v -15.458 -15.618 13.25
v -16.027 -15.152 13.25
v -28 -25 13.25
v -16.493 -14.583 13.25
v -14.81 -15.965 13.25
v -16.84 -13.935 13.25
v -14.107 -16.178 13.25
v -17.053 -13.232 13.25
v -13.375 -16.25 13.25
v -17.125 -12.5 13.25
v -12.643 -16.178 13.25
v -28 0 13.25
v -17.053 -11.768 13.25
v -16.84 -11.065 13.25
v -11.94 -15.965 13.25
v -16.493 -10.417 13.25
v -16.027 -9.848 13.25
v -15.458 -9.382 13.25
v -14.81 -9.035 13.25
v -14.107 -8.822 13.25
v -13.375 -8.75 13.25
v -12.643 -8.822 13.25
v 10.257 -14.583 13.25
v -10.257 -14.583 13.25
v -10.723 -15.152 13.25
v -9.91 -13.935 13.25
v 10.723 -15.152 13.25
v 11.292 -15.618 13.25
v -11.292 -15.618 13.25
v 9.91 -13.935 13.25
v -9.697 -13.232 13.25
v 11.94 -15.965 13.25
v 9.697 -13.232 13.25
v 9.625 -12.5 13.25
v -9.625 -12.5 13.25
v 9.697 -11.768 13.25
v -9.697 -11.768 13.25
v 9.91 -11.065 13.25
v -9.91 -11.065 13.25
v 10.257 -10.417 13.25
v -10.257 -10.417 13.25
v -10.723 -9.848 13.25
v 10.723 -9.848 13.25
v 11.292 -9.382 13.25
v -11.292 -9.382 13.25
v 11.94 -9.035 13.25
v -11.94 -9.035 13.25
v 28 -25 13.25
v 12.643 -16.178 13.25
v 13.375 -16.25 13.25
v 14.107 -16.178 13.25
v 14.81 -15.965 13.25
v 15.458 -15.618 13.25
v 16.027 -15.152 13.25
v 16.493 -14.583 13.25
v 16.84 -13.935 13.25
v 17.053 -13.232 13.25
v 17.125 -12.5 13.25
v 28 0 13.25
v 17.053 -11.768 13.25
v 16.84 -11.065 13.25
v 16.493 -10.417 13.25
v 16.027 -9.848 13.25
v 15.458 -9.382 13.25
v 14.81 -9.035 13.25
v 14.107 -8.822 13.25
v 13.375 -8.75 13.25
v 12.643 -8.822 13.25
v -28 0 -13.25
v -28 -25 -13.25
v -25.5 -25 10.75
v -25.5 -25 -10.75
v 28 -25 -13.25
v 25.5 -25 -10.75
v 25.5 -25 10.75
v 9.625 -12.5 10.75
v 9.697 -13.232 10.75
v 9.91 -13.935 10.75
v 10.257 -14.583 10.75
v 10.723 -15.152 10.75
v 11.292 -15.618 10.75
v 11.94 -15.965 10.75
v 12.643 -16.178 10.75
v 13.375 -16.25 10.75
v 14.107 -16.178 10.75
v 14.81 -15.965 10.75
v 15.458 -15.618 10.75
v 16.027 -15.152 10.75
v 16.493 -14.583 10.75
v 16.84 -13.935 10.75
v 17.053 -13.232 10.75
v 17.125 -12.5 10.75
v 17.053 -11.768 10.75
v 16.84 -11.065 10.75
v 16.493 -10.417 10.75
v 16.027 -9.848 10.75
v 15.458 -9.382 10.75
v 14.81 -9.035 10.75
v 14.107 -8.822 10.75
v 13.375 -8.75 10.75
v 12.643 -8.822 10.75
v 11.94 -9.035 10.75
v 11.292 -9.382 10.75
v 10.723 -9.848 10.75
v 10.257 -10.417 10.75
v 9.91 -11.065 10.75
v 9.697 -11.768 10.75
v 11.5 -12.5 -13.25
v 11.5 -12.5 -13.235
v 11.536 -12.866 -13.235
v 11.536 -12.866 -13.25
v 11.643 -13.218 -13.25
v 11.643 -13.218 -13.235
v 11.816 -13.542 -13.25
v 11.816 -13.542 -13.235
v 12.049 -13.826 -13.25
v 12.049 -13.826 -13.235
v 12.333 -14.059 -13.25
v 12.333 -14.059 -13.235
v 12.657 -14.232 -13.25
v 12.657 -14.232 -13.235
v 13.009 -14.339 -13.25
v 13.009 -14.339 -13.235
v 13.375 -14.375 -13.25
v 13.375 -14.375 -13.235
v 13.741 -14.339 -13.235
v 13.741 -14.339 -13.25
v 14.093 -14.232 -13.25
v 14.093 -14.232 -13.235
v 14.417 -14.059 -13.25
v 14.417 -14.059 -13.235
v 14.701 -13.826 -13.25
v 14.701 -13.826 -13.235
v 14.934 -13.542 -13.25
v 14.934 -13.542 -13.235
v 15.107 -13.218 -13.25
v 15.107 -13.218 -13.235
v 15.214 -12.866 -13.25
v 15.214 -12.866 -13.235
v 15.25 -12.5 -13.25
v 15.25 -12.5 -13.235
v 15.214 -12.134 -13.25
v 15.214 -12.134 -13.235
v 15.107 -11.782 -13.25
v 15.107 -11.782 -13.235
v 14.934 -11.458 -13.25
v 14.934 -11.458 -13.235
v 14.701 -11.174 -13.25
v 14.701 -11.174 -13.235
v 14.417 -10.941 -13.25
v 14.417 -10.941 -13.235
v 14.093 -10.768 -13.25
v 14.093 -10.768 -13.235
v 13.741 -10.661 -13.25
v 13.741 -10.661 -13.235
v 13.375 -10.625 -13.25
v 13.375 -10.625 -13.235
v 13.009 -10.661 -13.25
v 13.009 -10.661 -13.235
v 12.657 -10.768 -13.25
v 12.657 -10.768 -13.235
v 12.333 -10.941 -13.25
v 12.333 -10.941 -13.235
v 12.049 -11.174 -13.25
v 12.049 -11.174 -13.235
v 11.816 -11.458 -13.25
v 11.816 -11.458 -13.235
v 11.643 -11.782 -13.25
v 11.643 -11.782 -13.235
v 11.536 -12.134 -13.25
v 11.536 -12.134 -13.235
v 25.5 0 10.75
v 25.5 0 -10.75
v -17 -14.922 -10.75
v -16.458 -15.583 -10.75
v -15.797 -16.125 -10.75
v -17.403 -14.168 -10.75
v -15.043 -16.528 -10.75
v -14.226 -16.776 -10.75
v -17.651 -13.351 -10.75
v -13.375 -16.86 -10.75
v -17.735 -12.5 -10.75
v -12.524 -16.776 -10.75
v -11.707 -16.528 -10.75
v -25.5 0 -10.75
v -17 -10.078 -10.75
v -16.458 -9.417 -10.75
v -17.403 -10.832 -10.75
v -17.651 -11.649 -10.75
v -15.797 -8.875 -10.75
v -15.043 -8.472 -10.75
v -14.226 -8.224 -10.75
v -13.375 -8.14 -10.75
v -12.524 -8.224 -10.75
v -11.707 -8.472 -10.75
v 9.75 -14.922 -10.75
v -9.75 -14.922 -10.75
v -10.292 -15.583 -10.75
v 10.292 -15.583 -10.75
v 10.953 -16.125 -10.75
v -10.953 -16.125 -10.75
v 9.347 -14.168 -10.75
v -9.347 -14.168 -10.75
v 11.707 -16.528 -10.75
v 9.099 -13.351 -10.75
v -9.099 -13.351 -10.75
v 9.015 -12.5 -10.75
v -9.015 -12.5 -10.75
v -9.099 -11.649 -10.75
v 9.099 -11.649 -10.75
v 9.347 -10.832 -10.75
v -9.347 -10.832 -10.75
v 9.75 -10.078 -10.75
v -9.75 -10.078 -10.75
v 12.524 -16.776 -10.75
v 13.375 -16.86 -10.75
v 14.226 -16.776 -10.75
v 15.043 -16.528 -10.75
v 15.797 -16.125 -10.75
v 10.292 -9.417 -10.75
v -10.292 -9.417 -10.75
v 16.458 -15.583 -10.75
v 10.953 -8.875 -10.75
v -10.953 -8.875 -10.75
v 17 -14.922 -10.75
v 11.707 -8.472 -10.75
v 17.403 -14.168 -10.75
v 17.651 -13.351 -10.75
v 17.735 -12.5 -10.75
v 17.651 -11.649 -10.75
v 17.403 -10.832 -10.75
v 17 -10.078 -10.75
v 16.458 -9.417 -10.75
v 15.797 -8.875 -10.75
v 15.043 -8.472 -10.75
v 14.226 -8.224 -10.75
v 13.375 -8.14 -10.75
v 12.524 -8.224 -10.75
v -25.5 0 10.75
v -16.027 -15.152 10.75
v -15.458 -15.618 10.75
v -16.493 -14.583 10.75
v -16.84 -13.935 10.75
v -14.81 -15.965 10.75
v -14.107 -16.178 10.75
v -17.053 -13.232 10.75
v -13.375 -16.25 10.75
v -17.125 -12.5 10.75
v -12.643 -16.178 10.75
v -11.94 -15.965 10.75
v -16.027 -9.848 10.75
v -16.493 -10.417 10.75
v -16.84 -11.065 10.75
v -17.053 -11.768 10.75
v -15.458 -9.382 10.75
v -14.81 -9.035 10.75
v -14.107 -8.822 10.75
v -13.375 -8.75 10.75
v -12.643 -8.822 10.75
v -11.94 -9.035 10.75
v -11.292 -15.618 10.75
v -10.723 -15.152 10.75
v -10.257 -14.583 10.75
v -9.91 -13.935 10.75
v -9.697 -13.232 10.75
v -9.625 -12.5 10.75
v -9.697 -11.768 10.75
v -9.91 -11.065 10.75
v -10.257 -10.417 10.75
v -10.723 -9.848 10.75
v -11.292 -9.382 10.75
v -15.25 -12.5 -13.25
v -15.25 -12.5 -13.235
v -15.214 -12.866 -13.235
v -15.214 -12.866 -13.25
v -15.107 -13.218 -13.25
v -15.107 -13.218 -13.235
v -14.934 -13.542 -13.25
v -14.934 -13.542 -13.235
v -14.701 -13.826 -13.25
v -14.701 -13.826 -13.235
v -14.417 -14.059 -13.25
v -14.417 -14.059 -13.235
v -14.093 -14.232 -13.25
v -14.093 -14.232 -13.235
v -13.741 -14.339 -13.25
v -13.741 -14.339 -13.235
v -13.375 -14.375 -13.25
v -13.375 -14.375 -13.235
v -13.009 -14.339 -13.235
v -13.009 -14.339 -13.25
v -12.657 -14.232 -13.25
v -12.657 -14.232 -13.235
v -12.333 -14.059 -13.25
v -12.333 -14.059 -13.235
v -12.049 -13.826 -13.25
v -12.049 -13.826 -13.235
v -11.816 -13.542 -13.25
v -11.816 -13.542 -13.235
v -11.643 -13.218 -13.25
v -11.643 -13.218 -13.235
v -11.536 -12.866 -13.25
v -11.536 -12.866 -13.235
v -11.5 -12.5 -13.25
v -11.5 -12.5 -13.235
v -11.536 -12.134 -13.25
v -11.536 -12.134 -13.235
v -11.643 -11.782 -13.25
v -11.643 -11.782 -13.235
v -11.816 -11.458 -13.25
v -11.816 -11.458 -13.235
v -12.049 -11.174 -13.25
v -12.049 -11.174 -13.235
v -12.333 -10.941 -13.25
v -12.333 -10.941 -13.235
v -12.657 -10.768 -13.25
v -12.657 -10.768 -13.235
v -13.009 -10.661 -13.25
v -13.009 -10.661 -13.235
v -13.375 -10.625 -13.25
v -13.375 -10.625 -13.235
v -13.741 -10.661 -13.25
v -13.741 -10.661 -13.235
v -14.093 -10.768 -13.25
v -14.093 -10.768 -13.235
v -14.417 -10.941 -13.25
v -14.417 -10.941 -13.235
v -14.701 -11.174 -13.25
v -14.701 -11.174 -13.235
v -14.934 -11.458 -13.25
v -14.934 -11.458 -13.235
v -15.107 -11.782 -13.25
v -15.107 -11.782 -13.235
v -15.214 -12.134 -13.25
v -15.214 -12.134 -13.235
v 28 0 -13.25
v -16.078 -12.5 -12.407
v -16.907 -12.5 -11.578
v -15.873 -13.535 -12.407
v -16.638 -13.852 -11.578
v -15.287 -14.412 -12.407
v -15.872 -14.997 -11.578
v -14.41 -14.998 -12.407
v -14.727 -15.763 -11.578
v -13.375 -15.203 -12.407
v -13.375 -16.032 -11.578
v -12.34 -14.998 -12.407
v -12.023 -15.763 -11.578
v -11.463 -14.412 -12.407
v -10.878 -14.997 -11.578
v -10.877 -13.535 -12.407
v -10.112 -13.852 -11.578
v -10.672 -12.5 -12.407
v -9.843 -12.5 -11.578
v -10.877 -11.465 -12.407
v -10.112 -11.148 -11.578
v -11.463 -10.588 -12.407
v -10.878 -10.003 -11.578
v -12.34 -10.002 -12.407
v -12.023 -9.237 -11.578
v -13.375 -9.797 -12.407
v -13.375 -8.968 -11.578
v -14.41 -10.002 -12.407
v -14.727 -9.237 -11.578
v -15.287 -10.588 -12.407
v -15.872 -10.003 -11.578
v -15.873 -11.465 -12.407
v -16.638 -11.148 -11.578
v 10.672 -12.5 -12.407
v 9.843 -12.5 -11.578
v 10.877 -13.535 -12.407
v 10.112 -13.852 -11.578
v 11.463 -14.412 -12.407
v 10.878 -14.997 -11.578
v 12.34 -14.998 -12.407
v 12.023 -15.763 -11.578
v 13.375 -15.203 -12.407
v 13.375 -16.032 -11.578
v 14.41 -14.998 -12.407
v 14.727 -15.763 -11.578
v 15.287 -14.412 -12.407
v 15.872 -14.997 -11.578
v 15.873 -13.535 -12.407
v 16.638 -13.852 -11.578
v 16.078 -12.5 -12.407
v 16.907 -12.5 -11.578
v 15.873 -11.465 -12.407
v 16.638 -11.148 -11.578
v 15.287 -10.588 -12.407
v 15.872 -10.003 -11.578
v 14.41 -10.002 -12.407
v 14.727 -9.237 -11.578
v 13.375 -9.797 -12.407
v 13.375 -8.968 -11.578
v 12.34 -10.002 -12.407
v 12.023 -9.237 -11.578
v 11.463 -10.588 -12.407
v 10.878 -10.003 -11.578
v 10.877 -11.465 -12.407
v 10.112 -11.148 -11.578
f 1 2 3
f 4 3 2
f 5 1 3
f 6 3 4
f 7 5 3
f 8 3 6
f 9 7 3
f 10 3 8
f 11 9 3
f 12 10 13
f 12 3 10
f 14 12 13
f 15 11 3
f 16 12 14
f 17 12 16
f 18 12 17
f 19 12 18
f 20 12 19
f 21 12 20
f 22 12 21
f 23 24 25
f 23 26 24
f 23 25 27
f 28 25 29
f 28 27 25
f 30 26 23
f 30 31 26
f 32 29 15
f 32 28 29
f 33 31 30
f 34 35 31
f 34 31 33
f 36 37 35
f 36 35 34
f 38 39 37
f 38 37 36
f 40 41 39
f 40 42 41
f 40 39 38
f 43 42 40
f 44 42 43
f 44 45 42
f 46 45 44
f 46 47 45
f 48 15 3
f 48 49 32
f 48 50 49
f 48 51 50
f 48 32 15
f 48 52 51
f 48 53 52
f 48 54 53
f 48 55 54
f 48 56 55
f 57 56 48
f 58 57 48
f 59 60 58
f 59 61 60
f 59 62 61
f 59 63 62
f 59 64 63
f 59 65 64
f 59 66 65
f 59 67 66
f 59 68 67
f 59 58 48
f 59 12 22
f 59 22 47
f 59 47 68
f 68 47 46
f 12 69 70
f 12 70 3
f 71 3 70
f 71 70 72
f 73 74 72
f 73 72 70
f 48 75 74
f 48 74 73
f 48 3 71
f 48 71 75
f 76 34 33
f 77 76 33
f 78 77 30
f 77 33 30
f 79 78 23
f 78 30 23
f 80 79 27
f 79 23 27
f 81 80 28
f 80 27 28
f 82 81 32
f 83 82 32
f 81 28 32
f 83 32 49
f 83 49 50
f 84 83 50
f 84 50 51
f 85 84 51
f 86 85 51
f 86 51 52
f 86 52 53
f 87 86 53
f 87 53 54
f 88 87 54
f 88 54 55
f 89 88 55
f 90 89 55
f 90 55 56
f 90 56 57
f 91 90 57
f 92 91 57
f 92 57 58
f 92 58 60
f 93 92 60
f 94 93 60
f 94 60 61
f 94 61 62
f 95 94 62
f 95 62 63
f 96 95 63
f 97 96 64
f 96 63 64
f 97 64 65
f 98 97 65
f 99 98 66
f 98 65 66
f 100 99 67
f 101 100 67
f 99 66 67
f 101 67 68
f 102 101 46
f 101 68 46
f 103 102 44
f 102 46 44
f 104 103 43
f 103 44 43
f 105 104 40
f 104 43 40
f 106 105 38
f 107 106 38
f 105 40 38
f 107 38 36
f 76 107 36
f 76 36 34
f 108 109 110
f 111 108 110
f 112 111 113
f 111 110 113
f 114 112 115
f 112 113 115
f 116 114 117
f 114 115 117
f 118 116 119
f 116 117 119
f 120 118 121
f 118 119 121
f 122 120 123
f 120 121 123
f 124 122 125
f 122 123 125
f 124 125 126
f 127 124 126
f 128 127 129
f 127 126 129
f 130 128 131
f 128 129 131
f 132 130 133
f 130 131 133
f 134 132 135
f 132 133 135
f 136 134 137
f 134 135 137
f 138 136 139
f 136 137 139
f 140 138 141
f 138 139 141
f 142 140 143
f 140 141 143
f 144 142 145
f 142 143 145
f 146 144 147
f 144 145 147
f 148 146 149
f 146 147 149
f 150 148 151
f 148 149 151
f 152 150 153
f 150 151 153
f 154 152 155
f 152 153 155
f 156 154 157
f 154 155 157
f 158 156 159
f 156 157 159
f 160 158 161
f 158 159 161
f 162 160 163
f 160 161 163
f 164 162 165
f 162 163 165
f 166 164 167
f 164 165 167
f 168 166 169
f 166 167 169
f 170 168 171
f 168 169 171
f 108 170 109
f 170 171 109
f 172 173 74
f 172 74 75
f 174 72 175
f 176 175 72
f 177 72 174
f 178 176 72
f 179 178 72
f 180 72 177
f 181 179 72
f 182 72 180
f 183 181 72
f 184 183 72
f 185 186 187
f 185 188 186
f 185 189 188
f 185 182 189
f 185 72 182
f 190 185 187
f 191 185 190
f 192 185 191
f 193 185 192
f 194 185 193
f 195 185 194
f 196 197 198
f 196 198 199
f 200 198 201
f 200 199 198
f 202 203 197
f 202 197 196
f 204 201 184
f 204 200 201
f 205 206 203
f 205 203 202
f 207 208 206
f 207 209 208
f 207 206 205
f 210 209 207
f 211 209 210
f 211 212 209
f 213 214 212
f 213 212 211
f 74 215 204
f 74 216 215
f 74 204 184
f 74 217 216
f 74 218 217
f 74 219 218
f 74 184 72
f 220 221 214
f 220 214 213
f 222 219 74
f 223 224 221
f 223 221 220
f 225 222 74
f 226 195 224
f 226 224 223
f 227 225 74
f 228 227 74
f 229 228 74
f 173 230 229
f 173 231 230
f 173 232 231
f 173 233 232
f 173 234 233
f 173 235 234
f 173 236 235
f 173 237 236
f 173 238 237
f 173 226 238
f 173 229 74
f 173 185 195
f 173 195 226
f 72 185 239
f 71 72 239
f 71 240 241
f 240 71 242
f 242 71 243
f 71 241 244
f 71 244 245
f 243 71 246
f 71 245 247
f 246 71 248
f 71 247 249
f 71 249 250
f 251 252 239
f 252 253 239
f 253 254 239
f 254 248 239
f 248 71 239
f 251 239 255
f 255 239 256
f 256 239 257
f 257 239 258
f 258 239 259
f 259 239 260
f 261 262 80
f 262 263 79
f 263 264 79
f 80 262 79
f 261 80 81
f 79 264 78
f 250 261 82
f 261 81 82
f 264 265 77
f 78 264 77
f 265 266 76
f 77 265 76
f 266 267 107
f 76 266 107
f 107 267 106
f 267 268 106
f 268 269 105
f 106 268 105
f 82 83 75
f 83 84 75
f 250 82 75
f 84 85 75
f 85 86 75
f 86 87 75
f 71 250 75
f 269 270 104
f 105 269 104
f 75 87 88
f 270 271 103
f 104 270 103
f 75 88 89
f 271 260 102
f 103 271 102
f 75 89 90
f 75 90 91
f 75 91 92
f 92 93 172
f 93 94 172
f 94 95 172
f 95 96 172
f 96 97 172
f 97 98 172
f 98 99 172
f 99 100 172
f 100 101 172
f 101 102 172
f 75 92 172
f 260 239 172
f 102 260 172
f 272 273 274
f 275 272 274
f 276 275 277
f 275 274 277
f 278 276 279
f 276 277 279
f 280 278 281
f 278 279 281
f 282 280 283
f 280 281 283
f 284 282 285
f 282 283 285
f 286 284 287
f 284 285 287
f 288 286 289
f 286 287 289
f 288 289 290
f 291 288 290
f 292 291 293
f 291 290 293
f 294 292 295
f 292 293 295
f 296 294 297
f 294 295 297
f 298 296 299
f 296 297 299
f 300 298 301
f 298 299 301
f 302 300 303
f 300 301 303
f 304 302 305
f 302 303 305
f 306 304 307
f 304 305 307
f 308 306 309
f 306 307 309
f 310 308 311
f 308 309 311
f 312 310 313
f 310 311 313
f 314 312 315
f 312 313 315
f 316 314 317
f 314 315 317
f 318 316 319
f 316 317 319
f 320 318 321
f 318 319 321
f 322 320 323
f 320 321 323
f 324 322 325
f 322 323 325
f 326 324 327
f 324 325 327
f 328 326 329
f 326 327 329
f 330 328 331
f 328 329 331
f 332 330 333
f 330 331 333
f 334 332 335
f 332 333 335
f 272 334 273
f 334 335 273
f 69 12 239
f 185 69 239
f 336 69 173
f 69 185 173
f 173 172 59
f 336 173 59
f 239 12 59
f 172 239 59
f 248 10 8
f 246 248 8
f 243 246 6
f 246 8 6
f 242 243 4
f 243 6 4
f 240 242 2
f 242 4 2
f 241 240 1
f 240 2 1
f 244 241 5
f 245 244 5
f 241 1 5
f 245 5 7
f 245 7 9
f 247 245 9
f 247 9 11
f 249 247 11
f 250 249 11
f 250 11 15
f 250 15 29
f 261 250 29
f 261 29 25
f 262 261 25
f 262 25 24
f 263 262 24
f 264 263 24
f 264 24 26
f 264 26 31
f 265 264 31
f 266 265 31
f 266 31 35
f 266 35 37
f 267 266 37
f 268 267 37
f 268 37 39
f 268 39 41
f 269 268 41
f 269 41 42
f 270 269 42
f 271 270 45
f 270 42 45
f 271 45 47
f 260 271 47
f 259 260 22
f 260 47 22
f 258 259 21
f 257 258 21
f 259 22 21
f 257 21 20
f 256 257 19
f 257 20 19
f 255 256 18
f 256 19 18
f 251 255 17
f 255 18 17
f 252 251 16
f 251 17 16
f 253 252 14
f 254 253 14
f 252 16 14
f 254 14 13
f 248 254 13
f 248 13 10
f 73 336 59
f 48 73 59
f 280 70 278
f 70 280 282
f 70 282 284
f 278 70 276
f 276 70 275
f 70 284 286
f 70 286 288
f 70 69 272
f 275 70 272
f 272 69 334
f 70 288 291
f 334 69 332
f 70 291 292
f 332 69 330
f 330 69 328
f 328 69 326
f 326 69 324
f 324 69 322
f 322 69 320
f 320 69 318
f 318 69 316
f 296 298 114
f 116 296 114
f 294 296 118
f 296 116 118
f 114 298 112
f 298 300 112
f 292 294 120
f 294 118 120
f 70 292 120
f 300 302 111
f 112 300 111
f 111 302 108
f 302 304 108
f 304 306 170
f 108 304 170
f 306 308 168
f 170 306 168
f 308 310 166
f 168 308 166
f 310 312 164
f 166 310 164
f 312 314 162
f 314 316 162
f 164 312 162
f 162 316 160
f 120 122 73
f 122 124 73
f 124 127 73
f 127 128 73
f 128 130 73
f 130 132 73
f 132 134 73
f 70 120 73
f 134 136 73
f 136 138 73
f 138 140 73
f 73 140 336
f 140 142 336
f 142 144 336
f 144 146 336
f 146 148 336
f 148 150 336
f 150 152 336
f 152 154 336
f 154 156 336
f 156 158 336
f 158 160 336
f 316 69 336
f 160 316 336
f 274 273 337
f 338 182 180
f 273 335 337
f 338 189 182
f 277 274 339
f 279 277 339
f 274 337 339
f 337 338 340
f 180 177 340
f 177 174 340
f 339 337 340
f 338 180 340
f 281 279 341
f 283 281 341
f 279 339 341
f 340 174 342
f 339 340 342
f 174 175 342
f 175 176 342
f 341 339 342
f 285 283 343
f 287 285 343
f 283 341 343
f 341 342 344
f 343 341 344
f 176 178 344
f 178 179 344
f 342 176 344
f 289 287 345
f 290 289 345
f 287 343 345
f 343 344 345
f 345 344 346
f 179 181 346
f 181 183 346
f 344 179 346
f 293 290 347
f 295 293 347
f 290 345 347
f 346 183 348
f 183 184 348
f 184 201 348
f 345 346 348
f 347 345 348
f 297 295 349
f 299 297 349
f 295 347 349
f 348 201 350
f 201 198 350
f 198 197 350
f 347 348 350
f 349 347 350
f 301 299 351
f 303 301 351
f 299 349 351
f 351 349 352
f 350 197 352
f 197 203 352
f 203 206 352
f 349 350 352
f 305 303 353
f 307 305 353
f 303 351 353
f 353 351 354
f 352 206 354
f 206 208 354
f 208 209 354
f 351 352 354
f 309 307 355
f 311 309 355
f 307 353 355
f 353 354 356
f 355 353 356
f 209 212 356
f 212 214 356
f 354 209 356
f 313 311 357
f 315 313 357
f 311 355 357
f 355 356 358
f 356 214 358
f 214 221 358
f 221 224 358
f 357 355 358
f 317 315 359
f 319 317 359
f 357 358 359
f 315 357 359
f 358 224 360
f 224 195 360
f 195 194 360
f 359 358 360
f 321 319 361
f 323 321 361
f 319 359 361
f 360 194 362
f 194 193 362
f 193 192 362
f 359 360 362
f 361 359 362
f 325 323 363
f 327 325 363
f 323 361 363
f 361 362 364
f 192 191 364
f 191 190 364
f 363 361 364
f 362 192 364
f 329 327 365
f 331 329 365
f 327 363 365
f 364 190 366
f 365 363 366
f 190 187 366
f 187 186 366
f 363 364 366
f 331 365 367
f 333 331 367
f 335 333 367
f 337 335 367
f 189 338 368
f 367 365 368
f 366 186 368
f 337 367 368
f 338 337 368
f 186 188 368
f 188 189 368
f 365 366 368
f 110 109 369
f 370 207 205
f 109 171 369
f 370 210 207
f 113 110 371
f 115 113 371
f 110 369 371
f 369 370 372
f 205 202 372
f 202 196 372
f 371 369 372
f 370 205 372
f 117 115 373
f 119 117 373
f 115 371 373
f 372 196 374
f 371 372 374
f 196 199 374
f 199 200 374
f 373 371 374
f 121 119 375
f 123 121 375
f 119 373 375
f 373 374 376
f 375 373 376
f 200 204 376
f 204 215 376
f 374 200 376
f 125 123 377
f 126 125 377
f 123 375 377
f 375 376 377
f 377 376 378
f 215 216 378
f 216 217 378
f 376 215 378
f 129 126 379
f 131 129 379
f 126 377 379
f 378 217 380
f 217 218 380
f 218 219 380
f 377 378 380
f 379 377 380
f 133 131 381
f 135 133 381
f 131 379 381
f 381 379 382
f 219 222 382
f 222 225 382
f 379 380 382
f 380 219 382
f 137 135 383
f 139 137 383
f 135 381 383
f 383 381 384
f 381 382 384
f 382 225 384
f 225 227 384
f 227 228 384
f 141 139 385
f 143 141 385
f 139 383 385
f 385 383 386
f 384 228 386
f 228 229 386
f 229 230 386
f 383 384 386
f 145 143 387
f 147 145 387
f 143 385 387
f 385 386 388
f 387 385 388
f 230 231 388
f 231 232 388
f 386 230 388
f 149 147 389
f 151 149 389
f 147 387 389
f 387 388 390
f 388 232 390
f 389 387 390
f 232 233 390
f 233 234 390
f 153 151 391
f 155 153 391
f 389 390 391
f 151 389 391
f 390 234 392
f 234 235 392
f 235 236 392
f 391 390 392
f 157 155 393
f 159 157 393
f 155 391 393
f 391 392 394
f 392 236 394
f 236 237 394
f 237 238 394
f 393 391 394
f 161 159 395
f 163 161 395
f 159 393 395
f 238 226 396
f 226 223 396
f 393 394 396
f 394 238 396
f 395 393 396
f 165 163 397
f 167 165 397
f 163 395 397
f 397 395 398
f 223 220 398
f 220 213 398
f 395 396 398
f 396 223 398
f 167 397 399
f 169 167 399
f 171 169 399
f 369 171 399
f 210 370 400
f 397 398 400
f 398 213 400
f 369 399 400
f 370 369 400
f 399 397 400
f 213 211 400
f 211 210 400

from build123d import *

# Parameters (mm, degrees)
SKETCH_W          = 56
SKETCH_H          = 26.5
PAD_DEPTH         = 25
SKETCH001_W       = 51
SKETCH001_H       = 21.5
POCKET_DEPTH      = 0.001
POCKET_DEPTH_BACK = 25.001
SKETCH002_R       = 3.75
POCKET001_DEPTH   = 3.5
SKETCH003_R       = 1.875
POCKET002_DEPTH   = 2.5
CHAMFER_SIZE      = 2.485


with BuildPart() as part:
    # Sketch → Pad (new body)
    with BuildSketch(Plane.XZ):
        Rectangle(SKETCH_W, SKETCH_H)
    extrude(amount=PAD_DEPTH)

    # Sketch001 → Pocket (cut, two sides)
    with BuildSketch(Plane.XZ) as pocket_sk:
        Rectangle(SKETCH001_W, SKETCH001_H)
    extrude(amount=-POCKET_DEPTH, mode=Mode.SUBTRACT)
    extrude(pocket_sk.sketch, amount=POCKET_DEPTH_BACK, mode=Mode.SUBTRACT)

    # Sketch002 (on DatumPlane) → Pocket001 (cut)
    with BuildSketch(Plane(origin=(0, 0, 13.25), x_dir=(-1, 0, 0), z_dir=(0, 0, 1))):
        with Locations((-13.375, 12.5)):
            Circle(SKETCH002_R)
        with Locations((13.375, 12.5)):
            Circle(SKETCH002_R)
    extrude(amount=-POCKET001_DEPTH, mode=Mode.SUBTRACT)

    # Sketch003 (on DatumPlane) → Pocket002 (cut)
    with BuildSketch(Plane(origin=(0, 0, -10.75), x_dir=(-1, 0, 0), z_dir=(0, 0, 1))):
        with Locations((-13.375, 12.5)):
            Circle(SKETCH003_R)
        with Locations((13.375, 12.5)):
            Circle(SKETCH003_R)
    extrude(amount=-POCKET002_DEPTH, mode=Mode.SUBTRACT)

    # Chamfer
    chamfer_edges = [part.edges().sort_by_distance(p)[0] for p in [
        (-11.5, -12.5, -10.75),
        (15.25, -12.5, -10.75),
    ]]
    chamfer(chamfer_edges, length=CHAMFER_SIZE)


solid = part.part
